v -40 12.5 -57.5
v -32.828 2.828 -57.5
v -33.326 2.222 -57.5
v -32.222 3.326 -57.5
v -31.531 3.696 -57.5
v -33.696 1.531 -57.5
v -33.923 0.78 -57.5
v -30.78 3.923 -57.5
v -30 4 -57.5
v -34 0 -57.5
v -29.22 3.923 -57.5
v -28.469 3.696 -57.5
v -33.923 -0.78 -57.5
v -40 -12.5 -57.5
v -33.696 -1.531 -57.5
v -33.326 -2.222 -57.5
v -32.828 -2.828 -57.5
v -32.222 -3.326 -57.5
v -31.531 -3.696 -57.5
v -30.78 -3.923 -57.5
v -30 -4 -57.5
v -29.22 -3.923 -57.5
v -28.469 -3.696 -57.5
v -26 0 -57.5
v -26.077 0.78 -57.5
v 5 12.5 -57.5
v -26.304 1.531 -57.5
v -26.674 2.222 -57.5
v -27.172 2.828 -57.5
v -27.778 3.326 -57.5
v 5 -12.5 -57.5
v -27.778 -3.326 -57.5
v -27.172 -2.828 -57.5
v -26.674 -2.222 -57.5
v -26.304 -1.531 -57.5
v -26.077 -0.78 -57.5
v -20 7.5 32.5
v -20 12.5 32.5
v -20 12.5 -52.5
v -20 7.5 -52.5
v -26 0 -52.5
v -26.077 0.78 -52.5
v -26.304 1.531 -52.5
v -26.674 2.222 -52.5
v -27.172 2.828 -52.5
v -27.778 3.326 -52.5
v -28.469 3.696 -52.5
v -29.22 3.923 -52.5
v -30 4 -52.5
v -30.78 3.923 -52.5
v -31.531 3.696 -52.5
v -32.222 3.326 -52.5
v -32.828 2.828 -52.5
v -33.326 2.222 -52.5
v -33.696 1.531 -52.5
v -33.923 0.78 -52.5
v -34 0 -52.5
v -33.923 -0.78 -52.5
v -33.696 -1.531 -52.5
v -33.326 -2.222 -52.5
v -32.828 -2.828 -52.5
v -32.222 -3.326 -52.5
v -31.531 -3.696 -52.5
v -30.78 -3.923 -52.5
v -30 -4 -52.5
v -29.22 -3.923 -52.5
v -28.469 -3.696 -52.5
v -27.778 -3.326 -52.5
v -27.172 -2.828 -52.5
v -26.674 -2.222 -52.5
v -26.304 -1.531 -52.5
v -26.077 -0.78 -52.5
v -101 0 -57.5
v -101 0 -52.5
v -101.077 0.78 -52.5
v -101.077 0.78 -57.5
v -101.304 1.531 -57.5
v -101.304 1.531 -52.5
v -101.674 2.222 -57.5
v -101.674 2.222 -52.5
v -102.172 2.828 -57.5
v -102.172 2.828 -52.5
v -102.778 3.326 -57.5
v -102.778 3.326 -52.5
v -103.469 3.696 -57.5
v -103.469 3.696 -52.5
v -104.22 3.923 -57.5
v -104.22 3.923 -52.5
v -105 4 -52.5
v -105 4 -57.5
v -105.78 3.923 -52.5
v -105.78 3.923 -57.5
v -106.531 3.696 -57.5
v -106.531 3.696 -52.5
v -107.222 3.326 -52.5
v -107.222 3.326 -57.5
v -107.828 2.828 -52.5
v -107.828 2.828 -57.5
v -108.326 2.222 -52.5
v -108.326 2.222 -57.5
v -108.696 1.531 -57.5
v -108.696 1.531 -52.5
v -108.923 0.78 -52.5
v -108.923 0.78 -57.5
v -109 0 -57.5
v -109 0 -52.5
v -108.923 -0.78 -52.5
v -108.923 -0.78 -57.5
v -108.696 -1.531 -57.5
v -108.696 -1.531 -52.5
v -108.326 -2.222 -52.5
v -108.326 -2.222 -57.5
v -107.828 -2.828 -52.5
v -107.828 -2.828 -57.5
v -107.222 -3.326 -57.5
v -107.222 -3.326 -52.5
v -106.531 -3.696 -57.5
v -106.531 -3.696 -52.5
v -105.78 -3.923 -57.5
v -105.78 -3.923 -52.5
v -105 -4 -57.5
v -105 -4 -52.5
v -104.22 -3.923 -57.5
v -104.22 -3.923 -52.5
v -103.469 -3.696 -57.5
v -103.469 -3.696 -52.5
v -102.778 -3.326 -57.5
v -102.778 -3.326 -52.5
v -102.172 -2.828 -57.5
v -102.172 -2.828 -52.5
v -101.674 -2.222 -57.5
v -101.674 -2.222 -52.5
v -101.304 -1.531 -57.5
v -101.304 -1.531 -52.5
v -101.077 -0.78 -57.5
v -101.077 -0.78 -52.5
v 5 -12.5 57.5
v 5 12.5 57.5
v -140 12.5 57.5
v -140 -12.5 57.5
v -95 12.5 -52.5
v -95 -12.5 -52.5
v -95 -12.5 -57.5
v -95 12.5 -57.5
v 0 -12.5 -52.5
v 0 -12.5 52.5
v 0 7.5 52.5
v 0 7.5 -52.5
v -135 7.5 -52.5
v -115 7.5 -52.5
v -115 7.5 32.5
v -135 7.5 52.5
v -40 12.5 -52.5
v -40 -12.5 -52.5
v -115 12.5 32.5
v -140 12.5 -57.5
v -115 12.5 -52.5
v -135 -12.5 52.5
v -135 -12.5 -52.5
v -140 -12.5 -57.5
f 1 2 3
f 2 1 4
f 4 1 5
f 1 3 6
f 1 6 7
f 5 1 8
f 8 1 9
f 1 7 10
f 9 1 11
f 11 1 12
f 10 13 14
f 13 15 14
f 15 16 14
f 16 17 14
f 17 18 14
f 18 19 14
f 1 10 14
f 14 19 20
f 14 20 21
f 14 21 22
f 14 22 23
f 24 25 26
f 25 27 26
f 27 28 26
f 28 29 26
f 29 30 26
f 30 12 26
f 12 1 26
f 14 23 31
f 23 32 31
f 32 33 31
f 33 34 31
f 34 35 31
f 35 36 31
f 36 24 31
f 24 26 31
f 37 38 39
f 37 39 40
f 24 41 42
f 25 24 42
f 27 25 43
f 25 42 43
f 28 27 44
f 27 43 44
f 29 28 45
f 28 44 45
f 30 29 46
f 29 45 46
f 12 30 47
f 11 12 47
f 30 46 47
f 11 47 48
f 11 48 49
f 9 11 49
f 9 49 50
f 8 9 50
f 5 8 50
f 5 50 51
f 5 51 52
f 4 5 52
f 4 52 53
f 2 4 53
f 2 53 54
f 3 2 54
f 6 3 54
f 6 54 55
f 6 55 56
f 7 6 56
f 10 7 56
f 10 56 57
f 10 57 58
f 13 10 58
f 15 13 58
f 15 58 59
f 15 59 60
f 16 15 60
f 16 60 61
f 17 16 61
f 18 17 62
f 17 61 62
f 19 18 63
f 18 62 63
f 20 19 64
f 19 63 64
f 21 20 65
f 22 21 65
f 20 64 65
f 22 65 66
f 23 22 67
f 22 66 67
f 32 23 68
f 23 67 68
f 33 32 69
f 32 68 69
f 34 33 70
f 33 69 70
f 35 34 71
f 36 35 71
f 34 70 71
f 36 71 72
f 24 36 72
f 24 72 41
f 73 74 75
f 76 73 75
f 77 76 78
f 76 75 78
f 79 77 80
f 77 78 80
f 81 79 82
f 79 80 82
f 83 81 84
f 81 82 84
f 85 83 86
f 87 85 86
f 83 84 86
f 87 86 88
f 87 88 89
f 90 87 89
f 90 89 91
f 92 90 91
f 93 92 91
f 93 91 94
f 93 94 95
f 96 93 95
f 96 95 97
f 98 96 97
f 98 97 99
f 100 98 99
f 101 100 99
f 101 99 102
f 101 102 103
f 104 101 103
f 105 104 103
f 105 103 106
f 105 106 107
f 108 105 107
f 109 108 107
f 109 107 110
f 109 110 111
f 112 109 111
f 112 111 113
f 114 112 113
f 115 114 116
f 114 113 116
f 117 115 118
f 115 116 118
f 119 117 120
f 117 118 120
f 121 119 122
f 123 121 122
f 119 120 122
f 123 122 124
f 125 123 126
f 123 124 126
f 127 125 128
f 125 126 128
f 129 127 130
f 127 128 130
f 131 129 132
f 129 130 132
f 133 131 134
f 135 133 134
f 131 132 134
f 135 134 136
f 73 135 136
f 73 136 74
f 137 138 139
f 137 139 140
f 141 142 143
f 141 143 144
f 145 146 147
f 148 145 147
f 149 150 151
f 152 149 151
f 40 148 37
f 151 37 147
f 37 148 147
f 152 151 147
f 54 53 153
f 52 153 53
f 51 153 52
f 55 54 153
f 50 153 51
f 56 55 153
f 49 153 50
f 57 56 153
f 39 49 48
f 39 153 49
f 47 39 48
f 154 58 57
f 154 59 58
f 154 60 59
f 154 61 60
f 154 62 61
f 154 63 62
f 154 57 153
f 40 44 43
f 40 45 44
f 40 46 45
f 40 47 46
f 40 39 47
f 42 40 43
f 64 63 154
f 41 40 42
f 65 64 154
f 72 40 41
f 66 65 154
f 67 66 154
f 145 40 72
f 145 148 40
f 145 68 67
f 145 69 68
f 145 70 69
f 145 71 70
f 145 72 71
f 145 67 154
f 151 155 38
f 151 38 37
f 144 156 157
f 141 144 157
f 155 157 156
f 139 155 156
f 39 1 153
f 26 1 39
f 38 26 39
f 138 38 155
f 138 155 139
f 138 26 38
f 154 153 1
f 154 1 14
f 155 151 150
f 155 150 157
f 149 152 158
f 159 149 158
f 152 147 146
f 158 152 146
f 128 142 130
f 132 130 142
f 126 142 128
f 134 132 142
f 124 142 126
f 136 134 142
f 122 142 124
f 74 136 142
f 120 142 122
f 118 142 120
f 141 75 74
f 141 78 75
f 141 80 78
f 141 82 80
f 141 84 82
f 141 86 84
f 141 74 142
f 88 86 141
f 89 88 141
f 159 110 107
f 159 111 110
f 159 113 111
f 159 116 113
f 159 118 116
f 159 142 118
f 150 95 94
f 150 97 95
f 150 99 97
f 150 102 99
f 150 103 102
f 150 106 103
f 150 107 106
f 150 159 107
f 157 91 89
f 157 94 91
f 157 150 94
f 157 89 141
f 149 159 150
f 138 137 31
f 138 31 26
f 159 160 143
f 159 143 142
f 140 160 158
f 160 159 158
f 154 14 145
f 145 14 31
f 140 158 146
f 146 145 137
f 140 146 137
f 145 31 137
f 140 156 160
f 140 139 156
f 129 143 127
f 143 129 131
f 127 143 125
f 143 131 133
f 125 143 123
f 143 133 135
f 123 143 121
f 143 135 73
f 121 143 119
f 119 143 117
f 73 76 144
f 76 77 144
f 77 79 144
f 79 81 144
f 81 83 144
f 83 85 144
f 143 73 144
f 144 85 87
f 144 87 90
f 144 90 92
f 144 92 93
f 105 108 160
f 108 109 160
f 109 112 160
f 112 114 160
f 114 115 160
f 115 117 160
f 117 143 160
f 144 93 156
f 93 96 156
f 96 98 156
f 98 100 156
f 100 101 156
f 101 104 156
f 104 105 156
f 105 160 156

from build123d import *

# Parameters (mm, degrees)
F0_W      = 25
F0_H      = 115
F1_DEPTH  = 5
F2_W      = 25
F2_H      = 5
F3_DEPTH  = 140
F4_W      = 5
F4_H      = 25
F5_DEPTH  = 110
F6_W      = 25
F6_H      = 5
F7_DEPTH  = 40
F8_W      = 25
F8_H      = 5
F9_DEPTH  = 40
F10_W     = 5
F10_H     = 105
F11_DEPTH = 20
F12_W     = 5
F12_H     = 105
F13_DEPTH = 20
F14_W     = 5
F14_H     = 20
F15_DEPTH = 97.6
F17_R     = 4
F18_DEPTH = 25
F19_R     = 4
F20_DEPTH = 15
F21_DEPTH = 25
F22_DEPTH = 25


with BuildPart() as f1:
    # F0 (on Right) → F1 (new body)
    with BuildSketch(Plane.YZ):
        Rectangle(F0_W, F0_H)
    extrude(amount=F1_DEPTH)

    # F2 (on face) → F3 (join)
    with BuildSketch(Plane(origin=(0, 0, 0), x_dir=(0, -1, 0), z_dir=(-1, 0, 0))):
        with Locations((0, 55)):
            Rectangle(F2_W, F2_H)
    extrude(amount=F3_DEPTH)

    # F4 (on face) → F5 (join)
    with BuildSketch(Plane(origin=(0, 0, 52.5), x_dir=(1, 0, 0), z_dir=(0, 0, -1))):
        with Locations((-137.5, 0)):
            Rectangle(F4_W, F4_H)
    extrude(amount=F5_DEPTH)

    # F6 (on face) → F7 (join)
    with BuildSketch(Plane.YZ.offset(-135)):
        with Locations((0, -55)):
            Rectangle(F6_W, F6_H)
    extrude(amount=F7_DEPTH)

    # F8 (on face) → F9 (join)
    with BuildSketch(Plane(origin=(0, 0, 0), x_dir=(0, -1, 0), z_dir=(-1, 0, 0))):
        with Locations((0, -55)):
            Rectangle(F8_W, F8_H)
    extrude(amount=F9_DEPTH)

    # F10 (on face) → F11 (join)
    with BuildSketch(Plane.YZ.offset(-135)):
        with Locations((10, 0)):
            Rectangle(F10_W, F10_H)
    extrude(amount=F11_DEPTH)

    # F12 (on face) → F13 (join)
    with BuildSketch(Plane(origin=(0, 0, 0), x_dir=(0, -1, 0), z_dir=(-1, 0, 0))):
        with Locations((-10, 0)):
            Rectangle(F12_W, F12_H)
    extrude(amount=F13_DEPTH)

    # F14 (on face) → F15 (join)
    with BuildSketch(Plane(origin=(-20, 0, 0), x_dir=(0, -1, 0), z_dir=(-1, 0, 0))):
        with Locations((-10, 42.5)):
            Rectangle(F14_W, F14_H)
    extrude(amount=F15_DEPTH)

    # F17 (on face) → F18 (cut)
    with BuildSketch(Plane.XY.offset(-52.5)):
        with Locations((-105, 0)):
            Circle(F17_R)
    extrude(amount=-F18_DEPTH, mode=Mode.SUBTRACT)

    # F19 (on face) → F20 (cut)
    with BuildSketch(Plane.XY.offset(-52.5)):
        with Locations((-30, 0)):
            Circle(F19_R)
    extrude(amount=-F20_DEPTH, mode=Mode.SUBTRACT)

    # F17 (on face) → F21 (cut)
    with BuildSketch(Plane.XY.offset(-52.5)):
        with Locations((-105, 0)):
            Circle(F17_R)
    extrude(amount=-F21_DEPTH, mode=Mode.SUBTRACT)

    # F19 (on face) → F22 (cut)
    with BuildSketch(Plane.XY.offset(-52.5)):
        with Locations((-30, 0)):
            Circle(F19_R)
    extrude(amount=-F22_DEPTH, mode=Mode.SUBTRACT)


solid = f1.part
